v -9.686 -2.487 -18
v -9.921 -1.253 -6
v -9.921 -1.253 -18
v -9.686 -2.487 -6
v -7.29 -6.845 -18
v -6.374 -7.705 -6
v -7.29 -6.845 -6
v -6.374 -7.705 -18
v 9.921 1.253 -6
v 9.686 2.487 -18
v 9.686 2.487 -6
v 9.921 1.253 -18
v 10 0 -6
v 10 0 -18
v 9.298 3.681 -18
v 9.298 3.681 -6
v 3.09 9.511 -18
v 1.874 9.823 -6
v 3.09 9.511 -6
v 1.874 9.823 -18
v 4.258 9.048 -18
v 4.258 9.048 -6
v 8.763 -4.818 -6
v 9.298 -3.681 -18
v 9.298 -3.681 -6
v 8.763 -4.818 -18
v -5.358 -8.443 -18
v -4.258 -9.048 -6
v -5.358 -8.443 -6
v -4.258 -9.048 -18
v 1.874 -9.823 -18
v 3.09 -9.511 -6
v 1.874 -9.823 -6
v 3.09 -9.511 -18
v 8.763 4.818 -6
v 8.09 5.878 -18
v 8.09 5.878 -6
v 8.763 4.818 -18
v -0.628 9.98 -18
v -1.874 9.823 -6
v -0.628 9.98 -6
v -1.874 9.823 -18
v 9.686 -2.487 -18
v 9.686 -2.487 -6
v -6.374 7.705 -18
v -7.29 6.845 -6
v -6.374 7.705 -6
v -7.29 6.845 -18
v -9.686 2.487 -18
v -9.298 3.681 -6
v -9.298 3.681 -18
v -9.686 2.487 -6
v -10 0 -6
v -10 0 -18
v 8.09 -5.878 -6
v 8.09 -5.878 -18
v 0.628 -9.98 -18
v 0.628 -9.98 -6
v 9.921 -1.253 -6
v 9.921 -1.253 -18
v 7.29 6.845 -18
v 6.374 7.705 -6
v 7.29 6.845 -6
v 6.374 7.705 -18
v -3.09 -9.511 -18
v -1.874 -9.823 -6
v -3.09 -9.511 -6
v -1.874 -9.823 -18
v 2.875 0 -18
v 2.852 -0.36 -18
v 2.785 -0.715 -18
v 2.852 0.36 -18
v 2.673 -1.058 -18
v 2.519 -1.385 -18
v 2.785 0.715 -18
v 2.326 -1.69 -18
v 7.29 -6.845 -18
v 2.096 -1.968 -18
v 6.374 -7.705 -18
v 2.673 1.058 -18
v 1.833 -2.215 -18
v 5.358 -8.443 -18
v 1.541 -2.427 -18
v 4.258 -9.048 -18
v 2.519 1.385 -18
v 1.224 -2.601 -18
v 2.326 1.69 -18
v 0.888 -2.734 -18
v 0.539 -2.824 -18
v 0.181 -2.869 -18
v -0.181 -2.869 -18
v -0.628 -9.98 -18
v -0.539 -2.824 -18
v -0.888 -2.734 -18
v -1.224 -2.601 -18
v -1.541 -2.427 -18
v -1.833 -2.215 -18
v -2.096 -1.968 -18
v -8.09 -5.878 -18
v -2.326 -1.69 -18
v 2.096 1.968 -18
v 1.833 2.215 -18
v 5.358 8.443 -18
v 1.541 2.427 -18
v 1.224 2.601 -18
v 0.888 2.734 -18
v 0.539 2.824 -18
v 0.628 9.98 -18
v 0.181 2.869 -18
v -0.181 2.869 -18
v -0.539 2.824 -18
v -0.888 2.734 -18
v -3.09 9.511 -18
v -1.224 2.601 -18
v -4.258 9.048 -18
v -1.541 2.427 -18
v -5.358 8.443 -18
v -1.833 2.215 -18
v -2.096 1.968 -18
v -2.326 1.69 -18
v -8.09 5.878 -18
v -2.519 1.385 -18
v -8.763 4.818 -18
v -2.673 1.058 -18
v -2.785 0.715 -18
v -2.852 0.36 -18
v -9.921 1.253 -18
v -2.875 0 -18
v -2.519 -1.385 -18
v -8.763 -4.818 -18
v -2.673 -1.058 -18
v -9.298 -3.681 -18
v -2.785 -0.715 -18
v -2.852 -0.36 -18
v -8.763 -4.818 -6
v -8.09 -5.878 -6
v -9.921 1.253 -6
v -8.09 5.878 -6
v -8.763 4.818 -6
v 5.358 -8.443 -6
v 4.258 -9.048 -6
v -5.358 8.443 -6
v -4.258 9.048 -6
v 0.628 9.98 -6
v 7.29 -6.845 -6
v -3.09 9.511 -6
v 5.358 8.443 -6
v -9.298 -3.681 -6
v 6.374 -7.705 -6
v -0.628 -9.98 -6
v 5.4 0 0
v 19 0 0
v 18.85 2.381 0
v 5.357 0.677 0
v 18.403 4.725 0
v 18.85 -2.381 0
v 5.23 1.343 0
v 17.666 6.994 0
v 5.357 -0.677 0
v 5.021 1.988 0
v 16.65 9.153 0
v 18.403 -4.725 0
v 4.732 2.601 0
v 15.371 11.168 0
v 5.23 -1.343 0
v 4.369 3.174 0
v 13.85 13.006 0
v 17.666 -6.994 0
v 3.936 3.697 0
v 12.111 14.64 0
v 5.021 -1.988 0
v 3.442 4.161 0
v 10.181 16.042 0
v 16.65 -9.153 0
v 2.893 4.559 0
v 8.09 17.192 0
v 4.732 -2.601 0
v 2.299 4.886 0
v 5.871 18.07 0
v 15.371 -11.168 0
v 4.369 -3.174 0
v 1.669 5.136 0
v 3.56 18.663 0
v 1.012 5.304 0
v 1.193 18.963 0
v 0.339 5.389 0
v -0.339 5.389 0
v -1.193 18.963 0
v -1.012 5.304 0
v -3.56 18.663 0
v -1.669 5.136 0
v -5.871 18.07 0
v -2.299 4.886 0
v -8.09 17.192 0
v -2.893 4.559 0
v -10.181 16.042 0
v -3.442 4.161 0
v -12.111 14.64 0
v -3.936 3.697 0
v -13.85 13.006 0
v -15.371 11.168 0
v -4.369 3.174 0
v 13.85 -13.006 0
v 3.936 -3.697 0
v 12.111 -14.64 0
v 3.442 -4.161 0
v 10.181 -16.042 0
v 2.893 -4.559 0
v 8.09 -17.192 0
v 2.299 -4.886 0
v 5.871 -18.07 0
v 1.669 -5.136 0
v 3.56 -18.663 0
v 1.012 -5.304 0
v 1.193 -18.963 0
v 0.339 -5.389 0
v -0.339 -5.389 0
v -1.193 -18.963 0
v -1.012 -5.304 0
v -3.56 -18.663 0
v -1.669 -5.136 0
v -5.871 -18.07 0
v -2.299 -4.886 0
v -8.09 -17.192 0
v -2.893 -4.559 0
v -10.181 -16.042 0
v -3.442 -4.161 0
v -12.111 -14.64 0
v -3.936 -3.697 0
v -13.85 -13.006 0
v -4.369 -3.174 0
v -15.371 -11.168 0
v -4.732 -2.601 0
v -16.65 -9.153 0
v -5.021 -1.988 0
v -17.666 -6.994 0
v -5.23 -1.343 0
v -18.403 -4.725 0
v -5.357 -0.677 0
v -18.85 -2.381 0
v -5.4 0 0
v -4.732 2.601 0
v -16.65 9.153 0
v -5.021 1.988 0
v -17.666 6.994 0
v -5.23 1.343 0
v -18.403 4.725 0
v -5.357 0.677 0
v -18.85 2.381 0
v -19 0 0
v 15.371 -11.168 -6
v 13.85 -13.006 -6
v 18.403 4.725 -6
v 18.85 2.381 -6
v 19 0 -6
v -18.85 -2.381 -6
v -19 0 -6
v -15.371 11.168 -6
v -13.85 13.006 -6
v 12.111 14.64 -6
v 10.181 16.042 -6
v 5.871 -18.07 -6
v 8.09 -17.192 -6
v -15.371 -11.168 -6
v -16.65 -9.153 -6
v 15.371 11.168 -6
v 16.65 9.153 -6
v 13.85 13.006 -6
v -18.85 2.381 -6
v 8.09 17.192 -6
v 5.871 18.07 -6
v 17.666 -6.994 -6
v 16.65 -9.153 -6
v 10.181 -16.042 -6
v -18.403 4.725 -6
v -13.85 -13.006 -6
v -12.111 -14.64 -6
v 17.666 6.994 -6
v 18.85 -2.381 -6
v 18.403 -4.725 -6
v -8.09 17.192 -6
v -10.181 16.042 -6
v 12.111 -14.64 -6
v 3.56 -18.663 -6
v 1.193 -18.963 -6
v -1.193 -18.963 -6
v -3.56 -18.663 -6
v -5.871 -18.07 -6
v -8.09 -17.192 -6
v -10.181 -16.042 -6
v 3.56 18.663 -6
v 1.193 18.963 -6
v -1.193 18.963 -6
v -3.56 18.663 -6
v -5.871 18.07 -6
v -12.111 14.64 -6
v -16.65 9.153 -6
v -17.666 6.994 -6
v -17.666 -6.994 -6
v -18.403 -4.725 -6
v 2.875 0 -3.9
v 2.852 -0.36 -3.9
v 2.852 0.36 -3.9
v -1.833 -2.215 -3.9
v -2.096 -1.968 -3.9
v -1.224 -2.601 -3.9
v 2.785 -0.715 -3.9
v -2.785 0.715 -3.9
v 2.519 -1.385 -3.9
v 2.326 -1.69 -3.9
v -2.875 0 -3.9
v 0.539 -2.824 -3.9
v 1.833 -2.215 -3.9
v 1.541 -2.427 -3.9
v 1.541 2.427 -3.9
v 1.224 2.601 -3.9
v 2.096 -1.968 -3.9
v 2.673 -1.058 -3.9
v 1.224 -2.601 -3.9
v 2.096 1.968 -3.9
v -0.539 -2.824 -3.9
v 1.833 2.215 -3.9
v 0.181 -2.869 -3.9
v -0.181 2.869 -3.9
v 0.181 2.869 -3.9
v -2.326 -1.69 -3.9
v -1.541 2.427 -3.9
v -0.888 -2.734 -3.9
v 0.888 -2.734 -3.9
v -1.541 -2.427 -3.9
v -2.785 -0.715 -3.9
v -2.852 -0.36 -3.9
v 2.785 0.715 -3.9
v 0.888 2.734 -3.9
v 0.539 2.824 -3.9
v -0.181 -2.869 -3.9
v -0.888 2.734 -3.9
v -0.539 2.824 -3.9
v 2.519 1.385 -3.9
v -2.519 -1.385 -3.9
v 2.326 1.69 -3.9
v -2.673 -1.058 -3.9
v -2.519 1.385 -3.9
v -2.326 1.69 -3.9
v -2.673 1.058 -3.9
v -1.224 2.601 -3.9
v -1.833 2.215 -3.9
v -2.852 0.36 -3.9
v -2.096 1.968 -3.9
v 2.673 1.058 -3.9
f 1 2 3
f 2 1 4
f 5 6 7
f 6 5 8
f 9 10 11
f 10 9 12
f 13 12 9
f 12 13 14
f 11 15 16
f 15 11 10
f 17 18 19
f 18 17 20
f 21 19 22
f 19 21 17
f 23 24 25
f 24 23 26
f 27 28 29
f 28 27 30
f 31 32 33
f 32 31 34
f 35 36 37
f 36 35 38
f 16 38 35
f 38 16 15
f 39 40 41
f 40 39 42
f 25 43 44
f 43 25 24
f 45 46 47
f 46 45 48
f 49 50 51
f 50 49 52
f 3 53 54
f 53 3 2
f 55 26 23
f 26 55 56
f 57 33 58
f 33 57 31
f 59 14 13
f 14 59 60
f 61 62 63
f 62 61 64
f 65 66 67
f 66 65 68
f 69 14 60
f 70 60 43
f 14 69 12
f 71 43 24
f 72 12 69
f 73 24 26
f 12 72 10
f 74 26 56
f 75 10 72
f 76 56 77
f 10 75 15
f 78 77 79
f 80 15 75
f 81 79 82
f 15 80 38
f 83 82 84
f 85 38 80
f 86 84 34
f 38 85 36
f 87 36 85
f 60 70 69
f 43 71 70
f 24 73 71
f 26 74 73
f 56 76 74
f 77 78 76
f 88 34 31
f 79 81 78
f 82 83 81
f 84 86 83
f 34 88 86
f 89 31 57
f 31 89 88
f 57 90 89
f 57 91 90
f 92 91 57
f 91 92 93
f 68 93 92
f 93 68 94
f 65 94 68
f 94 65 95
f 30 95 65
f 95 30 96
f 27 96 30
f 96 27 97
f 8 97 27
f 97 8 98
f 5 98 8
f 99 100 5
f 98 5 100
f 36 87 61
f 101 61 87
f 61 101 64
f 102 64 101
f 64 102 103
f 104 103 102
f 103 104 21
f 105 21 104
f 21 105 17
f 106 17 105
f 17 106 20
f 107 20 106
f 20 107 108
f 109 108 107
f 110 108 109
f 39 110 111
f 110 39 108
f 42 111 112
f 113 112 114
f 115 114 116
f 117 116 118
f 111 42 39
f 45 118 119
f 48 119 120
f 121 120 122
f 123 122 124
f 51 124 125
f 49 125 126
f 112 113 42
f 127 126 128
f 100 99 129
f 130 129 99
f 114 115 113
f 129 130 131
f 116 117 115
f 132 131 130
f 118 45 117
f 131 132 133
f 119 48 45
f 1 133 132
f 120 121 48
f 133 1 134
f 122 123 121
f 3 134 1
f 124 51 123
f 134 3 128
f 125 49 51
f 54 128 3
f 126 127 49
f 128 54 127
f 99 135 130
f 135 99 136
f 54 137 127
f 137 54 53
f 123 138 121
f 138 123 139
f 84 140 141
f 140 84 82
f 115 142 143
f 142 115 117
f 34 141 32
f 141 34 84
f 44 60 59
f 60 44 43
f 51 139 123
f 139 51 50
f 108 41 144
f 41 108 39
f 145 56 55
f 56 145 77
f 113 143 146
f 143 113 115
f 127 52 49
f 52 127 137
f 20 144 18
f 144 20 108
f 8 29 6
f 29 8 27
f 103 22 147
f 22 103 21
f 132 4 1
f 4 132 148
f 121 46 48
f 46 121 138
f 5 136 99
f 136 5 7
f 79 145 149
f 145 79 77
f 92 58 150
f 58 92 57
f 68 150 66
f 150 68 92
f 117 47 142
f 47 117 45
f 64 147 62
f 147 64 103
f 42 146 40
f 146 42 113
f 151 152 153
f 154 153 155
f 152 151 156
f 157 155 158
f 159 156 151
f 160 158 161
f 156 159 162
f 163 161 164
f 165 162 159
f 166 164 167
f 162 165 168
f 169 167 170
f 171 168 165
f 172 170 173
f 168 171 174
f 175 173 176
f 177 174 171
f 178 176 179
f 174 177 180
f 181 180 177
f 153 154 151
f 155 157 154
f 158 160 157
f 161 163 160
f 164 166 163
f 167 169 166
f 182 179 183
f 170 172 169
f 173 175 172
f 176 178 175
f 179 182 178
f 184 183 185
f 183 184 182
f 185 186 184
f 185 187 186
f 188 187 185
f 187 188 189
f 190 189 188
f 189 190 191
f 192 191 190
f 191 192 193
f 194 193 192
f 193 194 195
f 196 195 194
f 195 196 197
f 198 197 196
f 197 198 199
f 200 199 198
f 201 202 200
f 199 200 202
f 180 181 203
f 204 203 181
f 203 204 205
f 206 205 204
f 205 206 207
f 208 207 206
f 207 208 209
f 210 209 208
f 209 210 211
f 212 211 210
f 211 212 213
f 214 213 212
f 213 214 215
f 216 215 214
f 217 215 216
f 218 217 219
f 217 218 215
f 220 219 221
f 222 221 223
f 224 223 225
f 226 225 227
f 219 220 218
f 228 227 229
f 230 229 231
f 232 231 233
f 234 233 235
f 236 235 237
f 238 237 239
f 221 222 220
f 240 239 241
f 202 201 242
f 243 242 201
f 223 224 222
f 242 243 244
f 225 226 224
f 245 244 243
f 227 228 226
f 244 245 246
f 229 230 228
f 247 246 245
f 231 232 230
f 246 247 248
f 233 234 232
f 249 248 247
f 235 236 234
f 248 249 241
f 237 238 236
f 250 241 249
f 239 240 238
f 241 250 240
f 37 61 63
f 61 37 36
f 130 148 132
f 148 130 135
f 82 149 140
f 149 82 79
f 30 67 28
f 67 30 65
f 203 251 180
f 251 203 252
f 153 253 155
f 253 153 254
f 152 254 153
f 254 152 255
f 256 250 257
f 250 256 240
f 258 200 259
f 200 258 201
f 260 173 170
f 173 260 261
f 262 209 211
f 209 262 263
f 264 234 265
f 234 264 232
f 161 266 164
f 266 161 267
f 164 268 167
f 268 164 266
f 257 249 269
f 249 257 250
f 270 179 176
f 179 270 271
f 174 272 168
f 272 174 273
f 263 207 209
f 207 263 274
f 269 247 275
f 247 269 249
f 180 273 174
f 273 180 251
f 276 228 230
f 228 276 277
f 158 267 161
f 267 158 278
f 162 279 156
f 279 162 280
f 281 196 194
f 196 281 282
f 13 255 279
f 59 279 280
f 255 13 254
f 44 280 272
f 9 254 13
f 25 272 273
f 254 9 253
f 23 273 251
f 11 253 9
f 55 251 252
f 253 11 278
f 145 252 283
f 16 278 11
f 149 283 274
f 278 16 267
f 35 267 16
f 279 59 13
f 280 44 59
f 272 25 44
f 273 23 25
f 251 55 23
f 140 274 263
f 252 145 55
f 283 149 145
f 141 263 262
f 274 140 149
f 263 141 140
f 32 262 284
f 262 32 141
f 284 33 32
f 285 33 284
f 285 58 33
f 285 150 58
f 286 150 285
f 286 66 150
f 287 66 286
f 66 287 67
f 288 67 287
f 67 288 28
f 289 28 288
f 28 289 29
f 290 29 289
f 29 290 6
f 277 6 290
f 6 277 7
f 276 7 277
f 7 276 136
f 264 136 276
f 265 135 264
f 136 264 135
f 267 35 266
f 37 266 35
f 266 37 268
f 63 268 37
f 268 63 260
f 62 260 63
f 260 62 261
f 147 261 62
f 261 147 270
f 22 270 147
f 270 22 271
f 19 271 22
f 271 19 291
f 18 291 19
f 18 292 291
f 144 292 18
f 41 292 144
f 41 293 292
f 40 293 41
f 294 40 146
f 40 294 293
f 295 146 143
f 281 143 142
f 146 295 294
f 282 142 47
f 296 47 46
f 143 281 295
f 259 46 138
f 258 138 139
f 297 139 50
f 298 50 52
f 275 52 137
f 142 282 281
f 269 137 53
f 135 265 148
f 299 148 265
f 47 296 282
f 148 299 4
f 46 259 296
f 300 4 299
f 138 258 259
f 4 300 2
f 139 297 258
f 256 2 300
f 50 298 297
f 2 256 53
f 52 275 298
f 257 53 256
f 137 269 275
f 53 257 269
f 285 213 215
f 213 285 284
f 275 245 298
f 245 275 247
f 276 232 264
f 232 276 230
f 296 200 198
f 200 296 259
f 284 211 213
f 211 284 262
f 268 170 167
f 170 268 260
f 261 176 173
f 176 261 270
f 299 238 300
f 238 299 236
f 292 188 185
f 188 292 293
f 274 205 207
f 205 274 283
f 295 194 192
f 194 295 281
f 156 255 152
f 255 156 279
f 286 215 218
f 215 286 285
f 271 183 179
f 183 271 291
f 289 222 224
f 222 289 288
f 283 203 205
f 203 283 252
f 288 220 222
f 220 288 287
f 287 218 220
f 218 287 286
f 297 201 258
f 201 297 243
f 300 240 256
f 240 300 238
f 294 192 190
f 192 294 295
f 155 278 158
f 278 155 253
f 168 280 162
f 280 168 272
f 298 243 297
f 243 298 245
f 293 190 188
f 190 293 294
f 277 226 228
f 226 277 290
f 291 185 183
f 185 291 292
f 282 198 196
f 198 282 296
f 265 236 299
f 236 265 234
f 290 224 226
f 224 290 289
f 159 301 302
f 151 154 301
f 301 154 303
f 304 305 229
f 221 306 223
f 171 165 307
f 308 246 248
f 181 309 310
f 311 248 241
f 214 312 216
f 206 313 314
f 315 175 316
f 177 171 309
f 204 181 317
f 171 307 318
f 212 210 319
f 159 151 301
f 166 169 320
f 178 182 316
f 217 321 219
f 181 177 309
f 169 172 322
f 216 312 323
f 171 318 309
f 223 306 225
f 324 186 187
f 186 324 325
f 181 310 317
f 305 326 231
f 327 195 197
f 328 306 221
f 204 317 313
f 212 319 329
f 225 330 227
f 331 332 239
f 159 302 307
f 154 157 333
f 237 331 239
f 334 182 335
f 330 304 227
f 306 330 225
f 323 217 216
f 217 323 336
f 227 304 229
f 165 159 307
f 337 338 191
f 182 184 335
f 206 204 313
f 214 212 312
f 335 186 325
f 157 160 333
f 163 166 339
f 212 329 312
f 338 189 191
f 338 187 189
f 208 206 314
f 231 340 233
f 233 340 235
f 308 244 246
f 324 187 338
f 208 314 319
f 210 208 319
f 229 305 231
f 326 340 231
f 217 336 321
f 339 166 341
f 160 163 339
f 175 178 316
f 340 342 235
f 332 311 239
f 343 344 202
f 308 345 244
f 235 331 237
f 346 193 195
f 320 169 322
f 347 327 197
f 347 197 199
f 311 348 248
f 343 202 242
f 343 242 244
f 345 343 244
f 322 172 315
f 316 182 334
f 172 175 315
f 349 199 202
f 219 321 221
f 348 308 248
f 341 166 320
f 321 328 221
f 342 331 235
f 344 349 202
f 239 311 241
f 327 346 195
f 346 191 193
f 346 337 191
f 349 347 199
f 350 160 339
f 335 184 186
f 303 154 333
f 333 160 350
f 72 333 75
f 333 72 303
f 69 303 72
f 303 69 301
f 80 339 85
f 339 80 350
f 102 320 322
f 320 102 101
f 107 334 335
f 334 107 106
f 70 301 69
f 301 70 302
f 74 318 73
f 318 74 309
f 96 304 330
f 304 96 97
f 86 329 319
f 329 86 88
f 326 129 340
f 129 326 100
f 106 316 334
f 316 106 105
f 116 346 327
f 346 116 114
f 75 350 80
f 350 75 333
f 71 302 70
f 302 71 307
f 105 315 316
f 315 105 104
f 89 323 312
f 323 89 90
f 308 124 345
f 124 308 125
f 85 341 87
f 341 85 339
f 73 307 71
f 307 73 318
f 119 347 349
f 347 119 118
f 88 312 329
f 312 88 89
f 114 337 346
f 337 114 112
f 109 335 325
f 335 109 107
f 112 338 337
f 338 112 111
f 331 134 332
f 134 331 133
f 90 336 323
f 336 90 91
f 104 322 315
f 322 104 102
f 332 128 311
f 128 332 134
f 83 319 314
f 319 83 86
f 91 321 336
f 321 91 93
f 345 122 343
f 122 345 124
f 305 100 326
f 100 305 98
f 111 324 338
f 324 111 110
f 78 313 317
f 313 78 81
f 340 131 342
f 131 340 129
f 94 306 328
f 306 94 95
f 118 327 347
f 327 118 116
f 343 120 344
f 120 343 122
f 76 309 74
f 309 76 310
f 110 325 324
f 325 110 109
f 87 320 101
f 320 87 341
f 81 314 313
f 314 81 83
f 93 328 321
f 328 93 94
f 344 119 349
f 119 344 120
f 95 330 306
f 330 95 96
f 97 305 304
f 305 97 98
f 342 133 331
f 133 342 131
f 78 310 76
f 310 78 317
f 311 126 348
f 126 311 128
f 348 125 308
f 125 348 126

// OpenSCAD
$fn = 50;


difference() {
	union() {
		translate(v = [0, 0, -18.0000000000]) {
			cylinder(h = 18, r = 10.0000000000);
		}
		translate(v = [0, 0, -6.0000000000]) {
			cylinder(h = 6, r = 19.0000000000);
		}
	}
	union() {
		translate(v = [0, 0, 0]) {
			rotate(a = [0, 0, 0]) {
				difference() {
					union() {
						#translate(v = [0, 0, -18.0000000000]) {
							cylinder(h = 18, r = 2.6000000000);
						}
						#translate(v = [0, 0, -3.9000000000]) {
							cylinder(h = 3.9000000000, r = 10.0000000000, r1 = 2.8750000000, r2 = 5.4000000000);
						}
						#translate(v = [0, 0, -18.0000000000]) {
							cylinder(h = 18, r = 2.8750000000);
						}
						#translate(v = [0, 0, -18.0000000000]) {
							cylinder(h = 18, r = 2.6000000000);
						}
					}
					union();
				}
			}
		}
	}
}
